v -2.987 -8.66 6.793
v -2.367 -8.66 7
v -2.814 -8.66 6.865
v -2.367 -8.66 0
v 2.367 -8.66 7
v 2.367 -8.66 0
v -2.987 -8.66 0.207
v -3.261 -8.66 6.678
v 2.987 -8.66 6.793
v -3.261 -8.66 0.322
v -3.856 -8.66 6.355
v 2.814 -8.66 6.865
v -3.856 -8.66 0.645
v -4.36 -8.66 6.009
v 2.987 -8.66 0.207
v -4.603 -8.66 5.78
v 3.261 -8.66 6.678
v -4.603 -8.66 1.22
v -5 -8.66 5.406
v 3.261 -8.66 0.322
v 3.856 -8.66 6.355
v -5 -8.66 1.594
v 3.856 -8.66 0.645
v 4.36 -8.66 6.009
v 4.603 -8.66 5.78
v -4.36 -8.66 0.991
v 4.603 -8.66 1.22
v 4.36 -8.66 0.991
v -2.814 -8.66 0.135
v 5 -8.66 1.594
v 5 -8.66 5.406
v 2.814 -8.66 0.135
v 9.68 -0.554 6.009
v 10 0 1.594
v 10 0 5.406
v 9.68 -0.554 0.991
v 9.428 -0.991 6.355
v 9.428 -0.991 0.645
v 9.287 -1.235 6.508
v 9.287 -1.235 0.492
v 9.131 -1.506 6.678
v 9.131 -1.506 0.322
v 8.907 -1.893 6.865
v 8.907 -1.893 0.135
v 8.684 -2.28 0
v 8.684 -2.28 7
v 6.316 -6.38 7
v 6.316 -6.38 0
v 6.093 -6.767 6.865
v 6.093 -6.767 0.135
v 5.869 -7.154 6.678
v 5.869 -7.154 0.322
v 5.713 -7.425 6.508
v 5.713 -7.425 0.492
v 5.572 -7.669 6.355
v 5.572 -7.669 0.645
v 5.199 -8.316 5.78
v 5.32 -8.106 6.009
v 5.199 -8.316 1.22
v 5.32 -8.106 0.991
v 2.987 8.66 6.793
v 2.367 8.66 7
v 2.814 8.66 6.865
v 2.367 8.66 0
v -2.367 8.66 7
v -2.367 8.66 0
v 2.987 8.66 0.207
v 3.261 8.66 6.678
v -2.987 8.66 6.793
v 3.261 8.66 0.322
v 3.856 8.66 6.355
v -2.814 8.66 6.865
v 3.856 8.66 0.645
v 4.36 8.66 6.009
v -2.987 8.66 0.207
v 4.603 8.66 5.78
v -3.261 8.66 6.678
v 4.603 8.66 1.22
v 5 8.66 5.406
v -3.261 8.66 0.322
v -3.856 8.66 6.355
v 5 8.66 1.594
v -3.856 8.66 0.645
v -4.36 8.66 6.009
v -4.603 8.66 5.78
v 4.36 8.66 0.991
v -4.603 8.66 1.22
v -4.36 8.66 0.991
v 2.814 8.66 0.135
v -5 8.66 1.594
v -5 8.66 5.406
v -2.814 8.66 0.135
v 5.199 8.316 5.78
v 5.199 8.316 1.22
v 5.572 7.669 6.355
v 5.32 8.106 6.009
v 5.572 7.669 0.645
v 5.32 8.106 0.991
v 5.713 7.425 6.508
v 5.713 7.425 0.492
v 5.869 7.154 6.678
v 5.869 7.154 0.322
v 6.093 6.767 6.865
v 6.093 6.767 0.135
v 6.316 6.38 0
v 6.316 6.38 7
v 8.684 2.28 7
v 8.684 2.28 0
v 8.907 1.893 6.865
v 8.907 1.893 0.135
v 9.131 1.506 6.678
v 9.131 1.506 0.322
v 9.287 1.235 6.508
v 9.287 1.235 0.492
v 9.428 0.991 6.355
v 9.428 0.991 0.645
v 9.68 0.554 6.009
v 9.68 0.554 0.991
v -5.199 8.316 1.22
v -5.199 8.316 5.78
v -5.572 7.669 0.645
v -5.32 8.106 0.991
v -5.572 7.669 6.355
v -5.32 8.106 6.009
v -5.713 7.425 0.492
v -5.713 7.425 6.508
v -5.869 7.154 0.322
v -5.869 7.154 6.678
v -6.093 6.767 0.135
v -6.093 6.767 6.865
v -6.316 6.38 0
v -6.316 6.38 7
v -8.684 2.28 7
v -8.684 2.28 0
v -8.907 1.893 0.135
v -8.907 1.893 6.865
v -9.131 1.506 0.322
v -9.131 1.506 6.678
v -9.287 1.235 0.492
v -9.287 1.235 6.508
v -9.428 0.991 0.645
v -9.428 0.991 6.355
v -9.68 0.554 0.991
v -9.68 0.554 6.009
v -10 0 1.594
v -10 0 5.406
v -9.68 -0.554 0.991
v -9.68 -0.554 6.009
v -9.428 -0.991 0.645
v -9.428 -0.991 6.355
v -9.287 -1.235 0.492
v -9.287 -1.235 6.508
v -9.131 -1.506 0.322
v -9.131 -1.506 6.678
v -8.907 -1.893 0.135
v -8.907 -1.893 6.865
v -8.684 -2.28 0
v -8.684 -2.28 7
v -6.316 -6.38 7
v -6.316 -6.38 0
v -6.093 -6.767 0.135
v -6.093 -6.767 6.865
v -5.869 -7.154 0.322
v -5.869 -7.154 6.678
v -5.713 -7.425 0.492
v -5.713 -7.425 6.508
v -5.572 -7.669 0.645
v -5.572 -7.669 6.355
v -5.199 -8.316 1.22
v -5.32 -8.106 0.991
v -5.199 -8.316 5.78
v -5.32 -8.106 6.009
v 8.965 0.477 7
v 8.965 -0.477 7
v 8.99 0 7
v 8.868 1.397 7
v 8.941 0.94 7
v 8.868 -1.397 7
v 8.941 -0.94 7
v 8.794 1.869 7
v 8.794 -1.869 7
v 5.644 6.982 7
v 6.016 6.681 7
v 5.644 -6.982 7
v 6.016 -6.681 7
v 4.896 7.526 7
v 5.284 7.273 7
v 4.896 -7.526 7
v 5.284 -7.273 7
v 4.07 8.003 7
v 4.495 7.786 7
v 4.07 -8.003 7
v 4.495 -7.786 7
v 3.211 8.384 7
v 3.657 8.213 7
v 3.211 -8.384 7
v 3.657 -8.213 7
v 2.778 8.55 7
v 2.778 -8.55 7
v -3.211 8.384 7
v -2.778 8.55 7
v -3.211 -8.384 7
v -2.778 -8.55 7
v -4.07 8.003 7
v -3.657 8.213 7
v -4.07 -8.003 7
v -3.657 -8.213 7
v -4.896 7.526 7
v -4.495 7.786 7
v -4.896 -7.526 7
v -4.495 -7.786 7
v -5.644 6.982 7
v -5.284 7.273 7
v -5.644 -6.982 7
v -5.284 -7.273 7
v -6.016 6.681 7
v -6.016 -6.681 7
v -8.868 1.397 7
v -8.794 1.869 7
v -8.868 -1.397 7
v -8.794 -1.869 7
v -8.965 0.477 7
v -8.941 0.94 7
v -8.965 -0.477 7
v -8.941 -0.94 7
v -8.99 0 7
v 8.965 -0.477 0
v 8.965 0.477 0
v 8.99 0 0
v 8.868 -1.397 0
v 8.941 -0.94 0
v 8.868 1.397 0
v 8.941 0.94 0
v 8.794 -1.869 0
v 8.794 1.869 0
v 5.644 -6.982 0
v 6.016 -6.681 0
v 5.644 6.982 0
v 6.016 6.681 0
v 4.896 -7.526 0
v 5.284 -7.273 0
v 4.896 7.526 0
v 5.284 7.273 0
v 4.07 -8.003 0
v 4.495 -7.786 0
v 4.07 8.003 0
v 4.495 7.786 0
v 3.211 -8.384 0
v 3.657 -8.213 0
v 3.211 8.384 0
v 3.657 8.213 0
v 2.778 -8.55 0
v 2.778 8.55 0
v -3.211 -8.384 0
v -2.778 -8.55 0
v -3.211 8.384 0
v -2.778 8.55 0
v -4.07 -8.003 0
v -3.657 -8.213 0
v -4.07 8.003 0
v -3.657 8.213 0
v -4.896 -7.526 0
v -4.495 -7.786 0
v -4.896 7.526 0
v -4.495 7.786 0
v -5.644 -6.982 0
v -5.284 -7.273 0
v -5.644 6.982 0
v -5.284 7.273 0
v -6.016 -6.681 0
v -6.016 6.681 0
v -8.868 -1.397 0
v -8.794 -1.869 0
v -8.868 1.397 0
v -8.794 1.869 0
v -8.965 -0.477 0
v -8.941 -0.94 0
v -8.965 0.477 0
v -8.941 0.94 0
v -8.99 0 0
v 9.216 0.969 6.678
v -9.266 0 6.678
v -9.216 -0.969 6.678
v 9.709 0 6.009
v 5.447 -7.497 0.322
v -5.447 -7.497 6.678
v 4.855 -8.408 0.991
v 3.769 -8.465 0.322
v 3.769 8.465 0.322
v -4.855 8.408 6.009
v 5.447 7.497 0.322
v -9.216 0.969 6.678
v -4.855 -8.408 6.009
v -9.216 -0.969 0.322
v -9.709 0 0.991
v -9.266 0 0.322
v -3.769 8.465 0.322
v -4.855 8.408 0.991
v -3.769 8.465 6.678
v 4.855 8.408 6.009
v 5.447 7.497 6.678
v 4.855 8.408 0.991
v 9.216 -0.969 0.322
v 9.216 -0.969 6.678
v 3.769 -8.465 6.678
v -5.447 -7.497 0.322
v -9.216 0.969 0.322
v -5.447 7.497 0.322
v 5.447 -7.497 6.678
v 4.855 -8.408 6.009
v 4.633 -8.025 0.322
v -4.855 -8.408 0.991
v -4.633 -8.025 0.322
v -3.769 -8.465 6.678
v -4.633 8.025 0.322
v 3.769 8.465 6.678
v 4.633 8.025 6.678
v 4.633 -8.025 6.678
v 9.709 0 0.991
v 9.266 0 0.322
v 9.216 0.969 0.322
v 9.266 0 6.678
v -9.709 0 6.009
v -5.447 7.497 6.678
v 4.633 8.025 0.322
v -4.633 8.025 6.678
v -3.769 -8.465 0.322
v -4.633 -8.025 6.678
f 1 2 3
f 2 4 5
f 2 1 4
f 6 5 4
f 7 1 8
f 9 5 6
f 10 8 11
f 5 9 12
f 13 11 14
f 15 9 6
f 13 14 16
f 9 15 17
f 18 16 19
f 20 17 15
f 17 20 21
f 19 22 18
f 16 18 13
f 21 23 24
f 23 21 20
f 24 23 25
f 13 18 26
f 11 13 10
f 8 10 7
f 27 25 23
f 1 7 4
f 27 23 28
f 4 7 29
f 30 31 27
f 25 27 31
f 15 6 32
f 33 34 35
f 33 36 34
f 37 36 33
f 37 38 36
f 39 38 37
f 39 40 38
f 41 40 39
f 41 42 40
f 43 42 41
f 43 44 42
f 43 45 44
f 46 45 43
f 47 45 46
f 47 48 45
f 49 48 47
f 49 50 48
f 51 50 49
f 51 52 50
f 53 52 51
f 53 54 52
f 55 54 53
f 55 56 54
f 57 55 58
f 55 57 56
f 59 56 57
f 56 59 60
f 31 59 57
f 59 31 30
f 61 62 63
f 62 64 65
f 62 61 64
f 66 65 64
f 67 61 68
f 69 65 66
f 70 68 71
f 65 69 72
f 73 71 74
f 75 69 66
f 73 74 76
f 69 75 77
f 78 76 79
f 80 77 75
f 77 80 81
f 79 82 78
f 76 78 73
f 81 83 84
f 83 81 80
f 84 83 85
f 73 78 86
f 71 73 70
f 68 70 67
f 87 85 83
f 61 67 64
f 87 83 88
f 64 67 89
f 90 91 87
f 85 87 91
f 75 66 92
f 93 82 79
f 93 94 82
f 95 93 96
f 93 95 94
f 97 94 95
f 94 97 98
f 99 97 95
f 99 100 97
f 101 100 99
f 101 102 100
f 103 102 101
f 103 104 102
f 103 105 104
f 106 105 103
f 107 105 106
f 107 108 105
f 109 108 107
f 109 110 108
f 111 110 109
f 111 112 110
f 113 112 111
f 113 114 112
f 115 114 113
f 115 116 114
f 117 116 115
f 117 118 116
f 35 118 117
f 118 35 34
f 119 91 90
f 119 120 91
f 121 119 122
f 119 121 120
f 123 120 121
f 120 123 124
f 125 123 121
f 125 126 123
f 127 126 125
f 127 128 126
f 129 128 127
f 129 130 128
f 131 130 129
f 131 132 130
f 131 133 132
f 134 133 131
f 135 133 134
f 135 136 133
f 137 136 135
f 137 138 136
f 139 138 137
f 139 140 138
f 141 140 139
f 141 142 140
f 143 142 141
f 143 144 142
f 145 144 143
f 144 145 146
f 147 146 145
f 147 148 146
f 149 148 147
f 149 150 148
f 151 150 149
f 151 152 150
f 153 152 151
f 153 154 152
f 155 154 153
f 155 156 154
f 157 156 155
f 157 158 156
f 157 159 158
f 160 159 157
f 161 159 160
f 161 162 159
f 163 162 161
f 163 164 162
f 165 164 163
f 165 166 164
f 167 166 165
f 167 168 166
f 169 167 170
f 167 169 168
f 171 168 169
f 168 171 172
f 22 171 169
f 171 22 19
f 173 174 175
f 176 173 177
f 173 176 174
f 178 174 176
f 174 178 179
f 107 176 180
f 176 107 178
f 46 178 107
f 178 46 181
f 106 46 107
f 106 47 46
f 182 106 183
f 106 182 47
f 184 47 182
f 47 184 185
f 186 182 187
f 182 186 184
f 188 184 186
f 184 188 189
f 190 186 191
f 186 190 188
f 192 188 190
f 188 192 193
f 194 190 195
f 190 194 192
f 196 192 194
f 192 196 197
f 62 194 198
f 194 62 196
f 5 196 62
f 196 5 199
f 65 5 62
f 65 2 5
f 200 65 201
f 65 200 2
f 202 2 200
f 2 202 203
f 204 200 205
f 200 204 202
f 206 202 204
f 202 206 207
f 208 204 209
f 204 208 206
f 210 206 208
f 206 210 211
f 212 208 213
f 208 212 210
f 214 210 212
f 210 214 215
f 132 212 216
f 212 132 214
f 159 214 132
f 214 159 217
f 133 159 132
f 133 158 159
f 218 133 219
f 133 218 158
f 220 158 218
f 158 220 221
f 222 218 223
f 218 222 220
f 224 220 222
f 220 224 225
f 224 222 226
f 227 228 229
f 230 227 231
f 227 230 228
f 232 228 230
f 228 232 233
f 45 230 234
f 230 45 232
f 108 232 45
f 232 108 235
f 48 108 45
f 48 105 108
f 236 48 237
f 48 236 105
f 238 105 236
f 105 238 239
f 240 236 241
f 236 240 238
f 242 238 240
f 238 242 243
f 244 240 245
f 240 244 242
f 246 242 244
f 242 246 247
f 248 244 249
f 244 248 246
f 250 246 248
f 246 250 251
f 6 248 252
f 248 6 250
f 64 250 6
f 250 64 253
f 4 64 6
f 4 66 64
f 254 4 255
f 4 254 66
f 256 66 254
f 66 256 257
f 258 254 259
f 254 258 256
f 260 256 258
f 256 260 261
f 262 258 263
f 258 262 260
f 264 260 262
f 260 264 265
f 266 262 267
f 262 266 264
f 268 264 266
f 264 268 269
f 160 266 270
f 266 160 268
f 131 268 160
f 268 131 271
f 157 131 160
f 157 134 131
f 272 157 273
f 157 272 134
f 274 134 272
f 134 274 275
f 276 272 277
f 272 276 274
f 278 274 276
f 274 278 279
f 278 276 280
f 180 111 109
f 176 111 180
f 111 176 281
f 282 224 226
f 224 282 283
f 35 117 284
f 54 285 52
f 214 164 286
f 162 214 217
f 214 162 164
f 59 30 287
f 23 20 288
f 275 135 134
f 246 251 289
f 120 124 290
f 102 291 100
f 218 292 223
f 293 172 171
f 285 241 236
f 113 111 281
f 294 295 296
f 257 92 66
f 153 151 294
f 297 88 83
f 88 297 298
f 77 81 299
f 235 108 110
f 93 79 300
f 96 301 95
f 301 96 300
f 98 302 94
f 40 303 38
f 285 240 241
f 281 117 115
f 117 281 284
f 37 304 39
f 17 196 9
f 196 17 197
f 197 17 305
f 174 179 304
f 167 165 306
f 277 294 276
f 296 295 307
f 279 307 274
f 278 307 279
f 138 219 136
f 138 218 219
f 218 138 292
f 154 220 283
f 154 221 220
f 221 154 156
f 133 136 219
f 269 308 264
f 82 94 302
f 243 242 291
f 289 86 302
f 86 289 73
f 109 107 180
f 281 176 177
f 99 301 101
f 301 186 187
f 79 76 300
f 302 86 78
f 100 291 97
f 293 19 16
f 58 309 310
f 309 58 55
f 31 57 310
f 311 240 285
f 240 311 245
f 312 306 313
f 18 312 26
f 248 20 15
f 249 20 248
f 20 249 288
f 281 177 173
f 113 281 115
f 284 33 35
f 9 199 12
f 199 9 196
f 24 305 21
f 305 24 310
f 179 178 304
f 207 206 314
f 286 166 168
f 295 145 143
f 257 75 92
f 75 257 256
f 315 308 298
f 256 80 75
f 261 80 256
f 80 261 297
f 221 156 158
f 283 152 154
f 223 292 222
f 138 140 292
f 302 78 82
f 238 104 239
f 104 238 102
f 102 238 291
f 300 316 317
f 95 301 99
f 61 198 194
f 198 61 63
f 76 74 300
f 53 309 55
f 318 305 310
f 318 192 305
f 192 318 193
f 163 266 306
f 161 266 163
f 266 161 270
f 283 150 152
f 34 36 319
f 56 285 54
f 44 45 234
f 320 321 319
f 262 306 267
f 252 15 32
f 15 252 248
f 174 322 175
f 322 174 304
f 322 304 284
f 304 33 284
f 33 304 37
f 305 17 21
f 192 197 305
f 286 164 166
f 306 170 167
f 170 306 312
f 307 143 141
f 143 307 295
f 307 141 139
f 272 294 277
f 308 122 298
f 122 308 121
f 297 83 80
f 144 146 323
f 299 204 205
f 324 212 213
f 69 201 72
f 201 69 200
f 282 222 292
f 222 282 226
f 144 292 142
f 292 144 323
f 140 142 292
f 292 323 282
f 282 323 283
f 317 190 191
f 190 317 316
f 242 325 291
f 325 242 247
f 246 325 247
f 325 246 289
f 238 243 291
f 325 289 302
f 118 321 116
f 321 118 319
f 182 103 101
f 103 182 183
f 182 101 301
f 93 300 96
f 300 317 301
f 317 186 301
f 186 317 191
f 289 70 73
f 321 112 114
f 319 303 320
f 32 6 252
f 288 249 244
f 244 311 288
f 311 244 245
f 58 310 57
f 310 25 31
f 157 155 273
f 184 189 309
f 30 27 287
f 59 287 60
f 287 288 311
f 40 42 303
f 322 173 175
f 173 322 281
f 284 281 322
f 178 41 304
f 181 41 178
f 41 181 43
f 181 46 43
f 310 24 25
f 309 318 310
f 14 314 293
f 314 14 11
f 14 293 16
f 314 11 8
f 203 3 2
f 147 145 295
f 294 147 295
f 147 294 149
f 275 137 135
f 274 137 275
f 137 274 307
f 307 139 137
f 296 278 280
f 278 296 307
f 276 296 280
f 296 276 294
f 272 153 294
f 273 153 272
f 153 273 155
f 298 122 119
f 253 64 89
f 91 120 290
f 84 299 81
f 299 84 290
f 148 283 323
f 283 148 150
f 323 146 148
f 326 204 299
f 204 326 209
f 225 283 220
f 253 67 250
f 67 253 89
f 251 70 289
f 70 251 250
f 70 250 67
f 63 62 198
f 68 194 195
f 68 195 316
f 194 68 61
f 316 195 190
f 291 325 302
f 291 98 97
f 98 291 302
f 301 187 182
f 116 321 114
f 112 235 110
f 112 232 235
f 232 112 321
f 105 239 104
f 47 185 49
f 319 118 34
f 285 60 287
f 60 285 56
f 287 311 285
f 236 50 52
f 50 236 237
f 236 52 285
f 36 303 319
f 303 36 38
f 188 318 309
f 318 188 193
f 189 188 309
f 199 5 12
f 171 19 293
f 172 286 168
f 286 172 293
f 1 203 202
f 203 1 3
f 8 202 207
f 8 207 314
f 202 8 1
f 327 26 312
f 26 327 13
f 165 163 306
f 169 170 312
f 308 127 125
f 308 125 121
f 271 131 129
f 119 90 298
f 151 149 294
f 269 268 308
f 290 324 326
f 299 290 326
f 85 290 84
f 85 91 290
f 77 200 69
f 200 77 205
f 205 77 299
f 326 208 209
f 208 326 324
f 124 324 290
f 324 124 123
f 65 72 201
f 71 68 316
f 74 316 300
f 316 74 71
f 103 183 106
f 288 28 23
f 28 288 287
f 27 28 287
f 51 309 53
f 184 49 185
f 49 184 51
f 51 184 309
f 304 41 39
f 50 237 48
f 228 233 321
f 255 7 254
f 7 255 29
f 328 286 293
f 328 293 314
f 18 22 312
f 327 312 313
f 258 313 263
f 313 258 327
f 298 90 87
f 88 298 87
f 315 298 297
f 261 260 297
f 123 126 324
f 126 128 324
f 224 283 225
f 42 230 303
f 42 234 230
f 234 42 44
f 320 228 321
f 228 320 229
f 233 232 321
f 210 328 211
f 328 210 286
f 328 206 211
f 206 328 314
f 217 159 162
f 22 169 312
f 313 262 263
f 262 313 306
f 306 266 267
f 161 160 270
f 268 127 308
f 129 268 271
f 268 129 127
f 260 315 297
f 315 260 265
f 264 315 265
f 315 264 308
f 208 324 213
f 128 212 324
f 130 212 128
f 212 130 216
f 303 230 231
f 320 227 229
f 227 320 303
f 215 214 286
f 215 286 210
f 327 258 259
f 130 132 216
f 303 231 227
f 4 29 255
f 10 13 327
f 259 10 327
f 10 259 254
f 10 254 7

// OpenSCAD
// file: ../utilities/cylinders.scad
// Calculates the $fn which should be used for a cylinder of a specific size.
function cylinder_sides(
  // The diameter of the cylinder.
  diameter
) = ceil(
  max(
    min(
      360 / $fa,
      diameter * PI / $fs
    ),
    8
  )
);

// Generates a grid of square perforations through a cylinder of a specific
// size.
module cylinder_perforations(
  // The diameter of the cylinder.
  diameter,
  // The height of the cylinder.
  length,
  // The size (width/height) of each perforation.
  perforation_size,
  // The target spacing between perforations.  This will be adjusted to fit
  // evenly on the cylinder.
  perforation_spacing
) {
  half_perimeter = diameter * PI / 2;
  angularPerforations = round(half_perimeter / perforation_spacing);
  zPerforations = round(length / perforation_spacing);
  for (angle = [0:180 / angularPerforations:180]) {
    rotate([0, 0, angle]) {
      for (z = [(length / zPerforations) * 0.5:length / zPerforations:length - (length / zPerforations) * 0.5]) {
        translate([0, 0, z]) {
          cube([diameter, perforation_size, perforation_size], center = true);
        };
      }
    };
  };
};

// Generates a "pipe" which lofts a sequence of circles together.
module cylinder_sequence(
  // The diameter of the first circle.
  initial_diameter,
  // An array of arrays, where each child array is two numbers:
  // - The length of the segment along Z.
  // - The diameter of the end of the segment.
  length_diameter_pairs,
  // The number of sides of all circles drawn.
  sides,
  // Used for recursion; leave as default.
  i = 0
) {
  if (i < len(length_diameter_pairs)) {
    cylinder(
      d1 = initial_diameter,
      d2 = length_diameter_pairs[i][1],
      h = length_diameter_pairs[i][0],
      $fn = sides
    );
    translate([
      0,
      0,
      length_diameter_pairs[i][0]
    ]) {
      cylinder_sequence(
        length_diameter_pairs[i][1],
        length_diameter_pairs,
        sides,
        i + 1
      );
    };
  };
};
// file: nut.scad
use <../utilities/cylinders.scad>

// Generates a nut exterior along Z+, including rounded vertices.
module components_nut(
  // The diameter of the nut, measures between opposing vertices.
  vertex_diameter,
  // The length of the nut along Z+.
  length,
  // The number of sides on the nut.
  sides,
  // The radiusing to apply horizontally.
  horizontal_radiusing,
  // The radiusing to apply vertically.
  vertical_radiusing
) {
  intersection() {
    cylinder(
      d = vertex_diameter,
      h = length,
      $fn = sides
    );
    translate([0, 0, length / 2]) {
      scale([
        vertex_diameter * horizontal_radiusing,
        vertex_diameter * horizontal_radiusing,
        length * vertical_radiusing
      ]) {
        sphere(1, $fn = cylinder_sides(norm([vertex_diameter, length]) * 2));
      };
    };
  };
};
// file: ../settings.scad
// When true, lower resolution primitives will be used.
draft = false;

$fs = draft ? 2 : 1;
$fa = draft ? 12 : 6;

// The amount of space left between parts which must fit together tightly.
tight_tolerance = 0.6;

// The amount of space left between parts which must fit together loosely.
loose_tolerance = 1;
// main file
include <../settings.scad>;
use <nut.scad>;

components_nut(20, 7, 6, 0.52, 1);
